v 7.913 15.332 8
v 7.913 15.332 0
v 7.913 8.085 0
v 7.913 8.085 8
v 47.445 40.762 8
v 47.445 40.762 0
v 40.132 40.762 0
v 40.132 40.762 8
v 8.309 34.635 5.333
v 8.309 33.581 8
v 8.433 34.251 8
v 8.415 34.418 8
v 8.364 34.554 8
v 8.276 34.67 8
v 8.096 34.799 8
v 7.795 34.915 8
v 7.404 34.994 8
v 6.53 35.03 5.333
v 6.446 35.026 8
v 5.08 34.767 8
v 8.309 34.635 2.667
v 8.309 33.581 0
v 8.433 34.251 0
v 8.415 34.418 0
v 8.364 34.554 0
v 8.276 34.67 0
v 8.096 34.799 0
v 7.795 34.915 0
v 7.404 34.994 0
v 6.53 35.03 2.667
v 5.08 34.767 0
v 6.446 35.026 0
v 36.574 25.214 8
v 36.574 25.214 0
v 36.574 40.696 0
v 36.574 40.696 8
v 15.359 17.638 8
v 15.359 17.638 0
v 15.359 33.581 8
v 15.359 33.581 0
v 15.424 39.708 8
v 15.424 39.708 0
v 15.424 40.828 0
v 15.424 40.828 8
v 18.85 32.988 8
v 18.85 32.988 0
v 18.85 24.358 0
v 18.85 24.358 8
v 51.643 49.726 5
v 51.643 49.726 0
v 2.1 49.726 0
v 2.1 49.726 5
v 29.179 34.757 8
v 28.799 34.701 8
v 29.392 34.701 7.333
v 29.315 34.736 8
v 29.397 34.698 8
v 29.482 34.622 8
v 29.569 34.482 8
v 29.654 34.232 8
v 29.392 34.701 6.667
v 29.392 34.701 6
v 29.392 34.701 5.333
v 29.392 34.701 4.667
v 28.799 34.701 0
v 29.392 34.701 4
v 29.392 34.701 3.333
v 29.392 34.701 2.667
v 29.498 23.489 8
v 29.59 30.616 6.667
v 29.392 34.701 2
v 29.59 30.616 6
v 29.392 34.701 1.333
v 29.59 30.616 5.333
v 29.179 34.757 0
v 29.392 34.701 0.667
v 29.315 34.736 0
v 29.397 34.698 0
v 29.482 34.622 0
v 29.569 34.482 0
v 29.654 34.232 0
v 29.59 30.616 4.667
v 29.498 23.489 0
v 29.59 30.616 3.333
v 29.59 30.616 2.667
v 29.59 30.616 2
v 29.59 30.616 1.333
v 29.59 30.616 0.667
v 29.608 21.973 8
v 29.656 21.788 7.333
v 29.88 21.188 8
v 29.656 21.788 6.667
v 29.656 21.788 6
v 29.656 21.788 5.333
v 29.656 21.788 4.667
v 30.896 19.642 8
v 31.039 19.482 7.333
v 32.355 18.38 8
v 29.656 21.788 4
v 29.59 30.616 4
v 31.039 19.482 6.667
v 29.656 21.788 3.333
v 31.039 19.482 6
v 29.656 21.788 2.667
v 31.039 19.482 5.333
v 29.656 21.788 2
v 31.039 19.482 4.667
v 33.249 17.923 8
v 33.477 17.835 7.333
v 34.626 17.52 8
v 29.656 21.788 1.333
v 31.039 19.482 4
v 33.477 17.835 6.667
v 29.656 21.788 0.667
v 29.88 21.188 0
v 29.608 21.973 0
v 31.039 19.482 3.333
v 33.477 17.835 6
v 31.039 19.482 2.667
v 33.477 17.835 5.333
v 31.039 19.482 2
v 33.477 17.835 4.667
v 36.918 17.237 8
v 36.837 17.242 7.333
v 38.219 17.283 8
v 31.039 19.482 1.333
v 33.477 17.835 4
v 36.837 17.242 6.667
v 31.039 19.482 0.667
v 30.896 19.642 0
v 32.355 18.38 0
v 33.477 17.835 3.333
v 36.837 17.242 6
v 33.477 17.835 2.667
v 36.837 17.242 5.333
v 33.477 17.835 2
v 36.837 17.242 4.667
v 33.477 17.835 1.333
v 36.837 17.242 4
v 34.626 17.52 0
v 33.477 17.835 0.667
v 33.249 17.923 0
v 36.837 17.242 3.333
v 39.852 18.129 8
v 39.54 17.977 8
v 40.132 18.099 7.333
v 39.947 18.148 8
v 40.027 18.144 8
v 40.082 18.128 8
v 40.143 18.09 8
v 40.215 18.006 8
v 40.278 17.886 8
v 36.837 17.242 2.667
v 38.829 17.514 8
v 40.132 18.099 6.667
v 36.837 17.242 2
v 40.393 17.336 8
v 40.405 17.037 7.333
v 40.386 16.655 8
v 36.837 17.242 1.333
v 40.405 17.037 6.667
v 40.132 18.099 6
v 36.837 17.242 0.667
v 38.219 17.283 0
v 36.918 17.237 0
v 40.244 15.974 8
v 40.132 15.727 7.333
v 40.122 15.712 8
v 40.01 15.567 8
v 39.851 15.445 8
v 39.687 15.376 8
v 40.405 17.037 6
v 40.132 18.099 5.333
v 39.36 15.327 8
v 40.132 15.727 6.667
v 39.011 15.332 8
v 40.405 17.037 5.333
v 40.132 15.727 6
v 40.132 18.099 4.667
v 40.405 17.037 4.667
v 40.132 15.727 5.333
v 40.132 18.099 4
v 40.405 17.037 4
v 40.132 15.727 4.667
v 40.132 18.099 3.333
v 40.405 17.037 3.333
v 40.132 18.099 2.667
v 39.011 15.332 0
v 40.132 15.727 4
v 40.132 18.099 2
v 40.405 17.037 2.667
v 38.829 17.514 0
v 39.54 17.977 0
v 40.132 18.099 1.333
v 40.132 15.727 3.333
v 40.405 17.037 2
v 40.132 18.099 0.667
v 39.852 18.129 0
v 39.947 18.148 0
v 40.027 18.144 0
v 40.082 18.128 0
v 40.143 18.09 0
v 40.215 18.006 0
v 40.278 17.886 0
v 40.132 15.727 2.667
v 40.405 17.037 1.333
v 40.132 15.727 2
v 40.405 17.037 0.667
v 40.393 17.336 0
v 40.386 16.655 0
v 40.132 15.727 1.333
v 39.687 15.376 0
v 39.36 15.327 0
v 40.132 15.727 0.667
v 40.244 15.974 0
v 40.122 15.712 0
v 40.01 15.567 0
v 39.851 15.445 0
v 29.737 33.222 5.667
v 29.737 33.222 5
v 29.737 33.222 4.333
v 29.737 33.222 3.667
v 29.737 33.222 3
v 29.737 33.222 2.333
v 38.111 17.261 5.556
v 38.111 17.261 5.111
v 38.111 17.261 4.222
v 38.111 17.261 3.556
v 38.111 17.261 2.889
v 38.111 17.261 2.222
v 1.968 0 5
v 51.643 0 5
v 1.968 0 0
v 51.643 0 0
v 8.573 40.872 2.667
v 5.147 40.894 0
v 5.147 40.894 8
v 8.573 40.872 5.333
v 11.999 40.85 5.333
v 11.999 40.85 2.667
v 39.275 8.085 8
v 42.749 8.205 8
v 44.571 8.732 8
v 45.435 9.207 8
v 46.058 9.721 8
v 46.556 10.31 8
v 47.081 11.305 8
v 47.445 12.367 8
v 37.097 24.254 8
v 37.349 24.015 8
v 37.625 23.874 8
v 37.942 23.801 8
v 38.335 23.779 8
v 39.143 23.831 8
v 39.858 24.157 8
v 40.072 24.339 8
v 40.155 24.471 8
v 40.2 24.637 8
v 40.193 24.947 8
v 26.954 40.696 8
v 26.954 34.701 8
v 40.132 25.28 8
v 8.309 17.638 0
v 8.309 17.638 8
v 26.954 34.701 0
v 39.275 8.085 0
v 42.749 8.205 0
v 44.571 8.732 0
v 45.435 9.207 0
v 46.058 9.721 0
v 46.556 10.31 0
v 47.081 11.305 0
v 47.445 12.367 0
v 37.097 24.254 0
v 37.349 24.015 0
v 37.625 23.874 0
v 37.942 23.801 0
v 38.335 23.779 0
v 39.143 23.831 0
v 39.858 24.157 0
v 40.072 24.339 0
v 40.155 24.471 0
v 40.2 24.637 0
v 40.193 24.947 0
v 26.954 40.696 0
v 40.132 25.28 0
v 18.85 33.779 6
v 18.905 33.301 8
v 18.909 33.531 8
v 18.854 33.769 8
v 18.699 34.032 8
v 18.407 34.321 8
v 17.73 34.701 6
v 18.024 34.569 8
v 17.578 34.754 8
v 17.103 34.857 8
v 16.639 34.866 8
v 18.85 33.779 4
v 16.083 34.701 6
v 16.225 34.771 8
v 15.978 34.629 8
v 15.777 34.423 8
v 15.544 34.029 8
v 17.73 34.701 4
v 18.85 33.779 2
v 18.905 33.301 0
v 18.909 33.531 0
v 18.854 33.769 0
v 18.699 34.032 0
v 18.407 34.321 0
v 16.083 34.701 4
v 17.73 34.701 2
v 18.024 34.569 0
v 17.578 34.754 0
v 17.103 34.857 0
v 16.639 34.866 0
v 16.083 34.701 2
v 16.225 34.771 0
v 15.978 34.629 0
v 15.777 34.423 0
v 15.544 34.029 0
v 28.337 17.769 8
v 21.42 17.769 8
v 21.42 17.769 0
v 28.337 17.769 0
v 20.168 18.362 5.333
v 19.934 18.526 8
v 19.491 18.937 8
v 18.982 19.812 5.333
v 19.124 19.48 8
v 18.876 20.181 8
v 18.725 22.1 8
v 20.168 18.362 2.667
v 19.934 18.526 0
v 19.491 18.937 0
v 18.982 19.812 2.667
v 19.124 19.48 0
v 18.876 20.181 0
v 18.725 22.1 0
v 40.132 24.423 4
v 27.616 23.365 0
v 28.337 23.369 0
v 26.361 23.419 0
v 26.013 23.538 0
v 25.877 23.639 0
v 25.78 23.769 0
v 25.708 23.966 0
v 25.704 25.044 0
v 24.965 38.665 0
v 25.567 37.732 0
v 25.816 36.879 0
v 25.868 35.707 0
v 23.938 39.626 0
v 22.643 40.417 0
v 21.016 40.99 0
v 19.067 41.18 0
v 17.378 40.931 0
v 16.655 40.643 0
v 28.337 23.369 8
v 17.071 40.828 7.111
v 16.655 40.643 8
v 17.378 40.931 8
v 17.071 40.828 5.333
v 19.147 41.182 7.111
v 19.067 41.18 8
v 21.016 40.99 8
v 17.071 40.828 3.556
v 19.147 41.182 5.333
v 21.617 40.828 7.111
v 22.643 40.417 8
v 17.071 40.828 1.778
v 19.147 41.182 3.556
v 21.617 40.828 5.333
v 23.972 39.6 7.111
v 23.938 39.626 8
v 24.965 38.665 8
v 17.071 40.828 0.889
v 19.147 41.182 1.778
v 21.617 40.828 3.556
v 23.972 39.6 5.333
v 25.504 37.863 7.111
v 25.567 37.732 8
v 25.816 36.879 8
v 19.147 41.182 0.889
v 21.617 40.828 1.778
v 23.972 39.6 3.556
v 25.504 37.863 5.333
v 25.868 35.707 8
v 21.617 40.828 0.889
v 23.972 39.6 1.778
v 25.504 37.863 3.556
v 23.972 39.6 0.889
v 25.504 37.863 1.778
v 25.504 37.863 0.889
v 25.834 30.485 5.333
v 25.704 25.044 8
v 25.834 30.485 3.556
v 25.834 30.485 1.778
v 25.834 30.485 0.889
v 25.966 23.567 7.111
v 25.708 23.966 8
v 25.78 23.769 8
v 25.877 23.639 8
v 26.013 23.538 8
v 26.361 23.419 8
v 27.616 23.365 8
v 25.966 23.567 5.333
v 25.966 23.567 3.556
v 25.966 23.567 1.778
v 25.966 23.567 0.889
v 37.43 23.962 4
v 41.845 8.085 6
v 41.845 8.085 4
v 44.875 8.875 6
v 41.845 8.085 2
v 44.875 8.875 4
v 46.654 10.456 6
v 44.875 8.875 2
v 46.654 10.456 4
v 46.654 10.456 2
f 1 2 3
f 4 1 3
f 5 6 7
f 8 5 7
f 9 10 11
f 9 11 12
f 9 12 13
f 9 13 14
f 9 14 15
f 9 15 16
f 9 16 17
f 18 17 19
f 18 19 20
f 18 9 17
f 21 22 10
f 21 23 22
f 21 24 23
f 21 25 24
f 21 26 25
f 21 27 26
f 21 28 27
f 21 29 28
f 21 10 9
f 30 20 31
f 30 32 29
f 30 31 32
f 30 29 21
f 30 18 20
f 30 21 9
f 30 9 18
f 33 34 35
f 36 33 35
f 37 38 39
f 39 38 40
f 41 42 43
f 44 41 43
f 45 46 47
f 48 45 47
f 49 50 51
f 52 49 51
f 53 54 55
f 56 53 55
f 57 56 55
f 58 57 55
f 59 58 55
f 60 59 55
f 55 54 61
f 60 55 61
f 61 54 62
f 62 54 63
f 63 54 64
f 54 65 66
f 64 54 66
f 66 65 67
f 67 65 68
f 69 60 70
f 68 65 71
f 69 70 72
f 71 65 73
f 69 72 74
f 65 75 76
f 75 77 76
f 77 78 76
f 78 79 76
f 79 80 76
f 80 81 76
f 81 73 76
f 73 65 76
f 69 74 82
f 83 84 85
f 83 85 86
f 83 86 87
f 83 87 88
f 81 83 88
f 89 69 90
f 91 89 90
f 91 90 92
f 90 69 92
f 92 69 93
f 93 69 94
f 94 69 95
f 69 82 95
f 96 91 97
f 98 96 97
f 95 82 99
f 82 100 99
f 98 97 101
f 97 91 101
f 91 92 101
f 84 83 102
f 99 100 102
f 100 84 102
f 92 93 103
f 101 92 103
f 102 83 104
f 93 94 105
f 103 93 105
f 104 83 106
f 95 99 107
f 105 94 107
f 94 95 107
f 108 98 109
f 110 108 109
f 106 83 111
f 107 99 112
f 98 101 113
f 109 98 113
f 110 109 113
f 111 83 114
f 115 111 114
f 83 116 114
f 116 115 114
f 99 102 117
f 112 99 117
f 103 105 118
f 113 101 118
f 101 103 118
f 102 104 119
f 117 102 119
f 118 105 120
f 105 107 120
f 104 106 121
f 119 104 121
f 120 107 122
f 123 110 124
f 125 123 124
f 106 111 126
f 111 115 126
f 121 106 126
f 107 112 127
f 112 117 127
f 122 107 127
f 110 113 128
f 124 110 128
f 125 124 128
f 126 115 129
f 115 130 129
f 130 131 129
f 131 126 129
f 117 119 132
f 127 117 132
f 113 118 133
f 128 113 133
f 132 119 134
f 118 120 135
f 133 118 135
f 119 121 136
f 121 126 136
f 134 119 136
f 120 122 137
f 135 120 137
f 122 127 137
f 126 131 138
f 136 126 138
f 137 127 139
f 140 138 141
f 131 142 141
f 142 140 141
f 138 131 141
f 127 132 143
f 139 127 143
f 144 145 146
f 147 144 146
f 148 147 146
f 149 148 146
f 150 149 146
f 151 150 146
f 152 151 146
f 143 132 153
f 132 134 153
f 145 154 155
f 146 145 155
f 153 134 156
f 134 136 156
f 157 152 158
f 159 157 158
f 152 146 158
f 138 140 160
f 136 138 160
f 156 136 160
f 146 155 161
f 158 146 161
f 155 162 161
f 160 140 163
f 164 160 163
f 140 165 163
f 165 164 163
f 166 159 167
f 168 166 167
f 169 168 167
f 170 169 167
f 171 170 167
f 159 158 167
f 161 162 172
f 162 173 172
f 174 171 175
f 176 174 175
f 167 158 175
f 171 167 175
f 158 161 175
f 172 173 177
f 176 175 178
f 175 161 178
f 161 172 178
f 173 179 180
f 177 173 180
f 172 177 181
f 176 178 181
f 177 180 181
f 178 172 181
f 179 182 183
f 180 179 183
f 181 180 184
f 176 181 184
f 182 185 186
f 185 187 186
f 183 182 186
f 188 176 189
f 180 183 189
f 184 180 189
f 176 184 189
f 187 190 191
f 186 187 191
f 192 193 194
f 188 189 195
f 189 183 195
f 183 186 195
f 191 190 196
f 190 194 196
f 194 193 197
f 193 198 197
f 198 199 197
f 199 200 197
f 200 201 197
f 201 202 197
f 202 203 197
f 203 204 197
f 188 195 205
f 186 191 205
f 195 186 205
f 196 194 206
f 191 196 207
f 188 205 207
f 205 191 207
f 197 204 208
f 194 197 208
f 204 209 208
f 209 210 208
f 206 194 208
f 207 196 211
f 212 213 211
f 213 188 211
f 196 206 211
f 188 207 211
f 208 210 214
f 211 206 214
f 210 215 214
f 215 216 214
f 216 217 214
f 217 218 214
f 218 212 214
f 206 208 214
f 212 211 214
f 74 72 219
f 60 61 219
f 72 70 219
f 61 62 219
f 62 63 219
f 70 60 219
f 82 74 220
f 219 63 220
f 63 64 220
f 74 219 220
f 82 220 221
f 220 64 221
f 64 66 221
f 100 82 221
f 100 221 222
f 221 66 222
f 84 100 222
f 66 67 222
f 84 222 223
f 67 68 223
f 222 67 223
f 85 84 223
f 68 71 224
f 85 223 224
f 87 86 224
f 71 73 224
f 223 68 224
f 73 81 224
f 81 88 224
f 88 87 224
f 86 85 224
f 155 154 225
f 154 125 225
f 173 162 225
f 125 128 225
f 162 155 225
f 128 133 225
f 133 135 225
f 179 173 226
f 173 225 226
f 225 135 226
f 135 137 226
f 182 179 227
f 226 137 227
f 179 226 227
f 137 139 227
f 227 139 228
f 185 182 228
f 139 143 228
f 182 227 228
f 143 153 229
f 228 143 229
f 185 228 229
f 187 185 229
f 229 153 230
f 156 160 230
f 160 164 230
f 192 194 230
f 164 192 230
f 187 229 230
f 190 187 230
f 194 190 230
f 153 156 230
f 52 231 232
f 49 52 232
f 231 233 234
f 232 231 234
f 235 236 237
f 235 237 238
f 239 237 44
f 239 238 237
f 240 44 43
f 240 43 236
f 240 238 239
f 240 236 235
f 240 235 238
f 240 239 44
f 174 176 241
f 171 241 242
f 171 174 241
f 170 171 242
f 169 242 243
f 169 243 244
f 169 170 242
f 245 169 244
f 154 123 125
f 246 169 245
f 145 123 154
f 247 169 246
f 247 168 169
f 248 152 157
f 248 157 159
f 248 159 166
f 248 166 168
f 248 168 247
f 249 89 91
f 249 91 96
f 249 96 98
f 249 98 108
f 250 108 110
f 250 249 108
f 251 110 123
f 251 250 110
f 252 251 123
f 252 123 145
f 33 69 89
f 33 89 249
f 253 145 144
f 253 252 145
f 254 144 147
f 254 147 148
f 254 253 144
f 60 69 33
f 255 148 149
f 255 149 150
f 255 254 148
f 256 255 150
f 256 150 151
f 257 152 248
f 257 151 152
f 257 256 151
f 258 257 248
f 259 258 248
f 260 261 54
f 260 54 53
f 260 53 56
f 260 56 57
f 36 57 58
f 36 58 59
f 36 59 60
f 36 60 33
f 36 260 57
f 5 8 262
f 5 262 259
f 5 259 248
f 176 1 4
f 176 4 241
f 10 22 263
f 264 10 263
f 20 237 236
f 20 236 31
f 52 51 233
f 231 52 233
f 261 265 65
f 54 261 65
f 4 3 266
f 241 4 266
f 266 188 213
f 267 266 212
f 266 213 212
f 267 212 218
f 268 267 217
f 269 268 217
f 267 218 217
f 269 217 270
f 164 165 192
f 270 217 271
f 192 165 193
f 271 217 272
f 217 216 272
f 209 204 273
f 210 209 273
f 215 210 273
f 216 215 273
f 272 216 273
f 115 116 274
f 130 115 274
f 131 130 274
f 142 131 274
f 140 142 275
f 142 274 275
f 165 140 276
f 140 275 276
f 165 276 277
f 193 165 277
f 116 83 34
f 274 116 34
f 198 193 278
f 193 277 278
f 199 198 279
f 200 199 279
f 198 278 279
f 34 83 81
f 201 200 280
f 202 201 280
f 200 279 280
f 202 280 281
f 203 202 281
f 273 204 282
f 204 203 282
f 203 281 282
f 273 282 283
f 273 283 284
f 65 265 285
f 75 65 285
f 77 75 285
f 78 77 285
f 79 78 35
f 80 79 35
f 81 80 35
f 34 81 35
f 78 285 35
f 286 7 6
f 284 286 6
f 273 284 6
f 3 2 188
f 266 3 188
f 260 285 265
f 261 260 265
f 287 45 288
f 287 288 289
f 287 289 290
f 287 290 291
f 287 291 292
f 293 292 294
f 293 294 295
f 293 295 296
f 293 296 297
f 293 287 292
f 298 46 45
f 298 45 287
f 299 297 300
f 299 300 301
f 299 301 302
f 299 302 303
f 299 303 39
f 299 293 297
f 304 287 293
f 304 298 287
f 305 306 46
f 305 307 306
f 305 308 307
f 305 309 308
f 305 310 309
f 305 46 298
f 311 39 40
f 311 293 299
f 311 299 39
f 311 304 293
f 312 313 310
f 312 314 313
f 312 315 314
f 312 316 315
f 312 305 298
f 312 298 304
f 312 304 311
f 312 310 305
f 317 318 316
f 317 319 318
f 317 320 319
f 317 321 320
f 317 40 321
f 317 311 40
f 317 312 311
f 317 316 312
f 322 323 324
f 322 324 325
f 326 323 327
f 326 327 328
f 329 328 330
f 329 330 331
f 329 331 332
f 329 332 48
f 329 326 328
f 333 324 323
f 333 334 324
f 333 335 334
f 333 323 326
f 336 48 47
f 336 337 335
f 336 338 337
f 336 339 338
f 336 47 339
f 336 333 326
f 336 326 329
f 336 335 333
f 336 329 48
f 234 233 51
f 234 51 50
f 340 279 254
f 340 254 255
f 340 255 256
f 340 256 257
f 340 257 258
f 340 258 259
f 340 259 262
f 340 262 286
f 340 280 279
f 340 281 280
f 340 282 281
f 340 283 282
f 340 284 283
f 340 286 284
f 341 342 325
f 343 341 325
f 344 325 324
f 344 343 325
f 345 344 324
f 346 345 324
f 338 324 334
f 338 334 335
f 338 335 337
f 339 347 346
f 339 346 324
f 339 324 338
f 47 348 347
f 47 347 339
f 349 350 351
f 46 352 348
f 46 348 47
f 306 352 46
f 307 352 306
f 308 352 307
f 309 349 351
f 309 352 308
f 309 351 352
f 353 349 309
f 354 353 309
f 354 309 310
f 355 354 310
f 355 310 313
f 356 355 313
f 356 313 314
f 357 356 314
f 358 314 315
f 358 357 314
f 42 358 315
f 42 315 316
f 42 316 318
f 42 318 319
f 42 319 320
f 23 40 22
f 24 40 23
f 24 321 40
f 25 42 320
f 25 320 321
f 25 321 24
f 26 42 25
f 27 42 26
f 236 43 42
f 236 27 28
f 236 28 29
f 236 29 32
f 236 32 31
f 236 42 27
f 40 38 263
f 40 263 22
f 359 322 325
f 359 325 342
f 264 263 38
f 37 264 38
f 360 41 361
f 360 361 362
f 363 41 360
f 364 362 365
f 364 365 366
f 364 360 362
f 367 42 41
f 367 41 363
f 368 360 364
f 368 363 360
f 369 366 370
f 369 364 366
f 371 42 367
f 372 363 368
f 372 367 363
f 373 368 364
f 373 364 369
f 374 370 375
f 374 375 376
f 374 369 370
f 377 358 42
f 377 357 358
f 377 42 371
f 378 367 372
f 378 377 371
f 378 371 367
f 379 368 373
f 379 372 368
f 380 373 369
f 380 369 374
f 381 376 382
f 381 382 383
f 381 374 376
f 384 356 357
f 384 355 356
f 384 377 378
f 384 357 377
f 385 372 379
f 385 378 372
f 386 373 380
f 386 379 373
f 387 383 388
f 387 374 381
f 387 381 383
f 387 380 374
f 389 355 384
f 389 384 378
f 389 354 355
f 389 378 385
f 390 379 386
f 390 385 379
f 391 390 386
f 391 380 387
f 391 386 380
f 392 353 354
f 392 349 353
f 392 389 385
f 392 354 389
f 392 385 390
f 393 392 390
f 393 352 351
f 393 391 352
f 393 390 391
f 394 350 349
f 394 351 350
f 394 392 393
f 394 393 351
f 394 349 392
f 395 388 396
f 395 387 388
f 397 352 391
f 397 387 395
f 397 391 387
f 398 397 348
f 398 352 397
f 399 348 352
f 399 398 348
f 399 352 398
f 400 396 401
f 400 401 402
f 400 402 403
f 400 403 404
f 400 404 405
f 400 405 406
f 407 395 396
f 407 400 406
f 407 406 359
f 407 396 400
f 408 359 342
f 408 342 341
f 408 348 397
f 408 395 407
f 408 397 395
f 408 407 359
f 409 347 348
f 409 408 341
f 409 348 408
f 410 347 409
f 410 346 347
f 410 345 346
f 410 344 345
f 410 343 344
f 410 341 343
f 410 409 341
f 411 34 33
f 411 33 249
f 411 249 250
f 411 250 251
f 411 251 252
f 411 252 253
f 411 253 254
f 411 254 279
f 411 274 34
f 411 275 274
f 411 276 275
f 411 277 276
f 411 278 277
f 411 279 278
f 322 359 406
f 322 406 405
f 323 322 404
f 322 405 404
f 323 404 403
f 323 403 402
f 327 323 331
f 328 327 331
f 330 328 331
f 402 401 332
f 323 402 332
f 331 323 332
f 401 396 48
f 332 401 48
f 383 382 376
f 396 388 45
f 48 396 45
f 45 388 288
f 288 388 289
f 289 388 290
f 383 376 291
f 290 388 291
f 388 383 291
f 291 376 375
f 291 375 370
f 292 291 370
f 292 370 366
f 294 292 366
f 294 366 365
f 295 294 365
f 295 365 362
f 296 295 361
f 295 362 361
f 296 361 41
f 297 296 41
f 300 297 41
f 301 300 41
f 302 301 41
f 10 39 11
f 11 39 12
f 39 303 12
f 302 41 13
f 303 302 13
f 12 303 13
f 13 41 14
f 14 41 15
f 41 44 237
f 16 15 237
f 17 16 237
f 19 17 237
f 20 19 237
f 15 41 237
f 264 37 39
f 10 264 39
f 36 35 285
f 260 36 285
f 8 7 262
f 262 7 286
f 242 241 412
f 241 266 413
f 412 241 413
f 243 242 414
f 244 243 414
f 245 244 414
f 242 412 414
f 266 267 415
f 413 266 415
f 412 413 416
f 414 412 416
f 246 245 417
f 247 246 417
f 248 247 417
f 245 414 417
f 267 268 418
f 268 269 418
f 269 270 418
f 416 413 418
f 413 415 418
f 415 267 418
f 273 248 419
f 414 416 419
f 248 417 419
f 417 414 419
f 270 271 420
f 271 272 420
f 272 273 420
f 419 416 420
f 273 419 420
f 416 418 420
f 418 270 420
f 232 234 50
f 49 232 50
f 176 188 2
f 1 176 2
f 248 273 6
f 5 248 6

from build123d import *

# Parameters (mm, degrees)
F2_DEPTH = 8
F3_DEPTH = 5


with BuildPart() as f2:
    # F0 (on Top) → F2 (new body)
    with BuildSketch(Plane.XY):
        with BuildLine():
            add(Edge.make_bspline(
                [(5.1468131132, 40.8939681947), (8.5726830487, 40.8720076084), (11.9985529842, 40.8500470221), (15.4244229198, 40.8280864358)],
                knots=[0, 0, 0, 0, 10.2778209627, 10.2778209627, 10.2778209627, 10.2778209627], degree=3))
            Line((5.1468131132, 40.8939681947), (5.080409348, 34.7669310868))
            add(Edge.make_bspline(
                [(8.308799006, 33.5810557008), (8.4166843158, 33.9803333101), (8.6664194374, 34.9045892864), (6.4237051335, 35.1374542666), (5.51203556, 34.8859871564), (5.080409348, 34.7669310868)],
                knots=[0, 0, 0, 0, 0.2859570895, 0.6619393193, 1, 1, 1, 1], degree=3))
            Line((8.308799006, 33.5810557008), (8.308799006, 17.6375824958))
            Line((8.308799006, 17.6375824958), (15.3585495427, 17.6375824958))
            Line((15.3585495427, 17.6375824958), (15.3585495427, 33.5810557008))
            add(Edge.make_bspline(
                [(18.8504811376, 32.9881161451), (18.904430445, 33.2510216055), (19.0314662806, 33.870091923), (17.7888736775, 34.885354278), (15.9021250027, 34.9773397156), (15.5332666309, 34.0298520415), (15.3585495427, 33.5810557008)],
                knots=[0, 0, 0, 0, 0.1961885457, 0.4619702654, 0.7451515384, 1, 1, 1, 1], degree=3))
            Line((18.8504811376, 32.9881161451), (18.8504811376, 29.2328353971))
            Line((18.8504811376, 29.2328353971), (18.8504811376, 24.3575591594))
            add(Edge.make_bspline(
                [(21.4196946472, 17.7693478763), (20.998738388, 17.9339115532), (20.0882570431, 18.2898443956), (18.5126469133, 19.7972904354), (18.7225966583, 22.631305425), (18.8504811376, 24.3575591594)],
                knots=[0, 0, 0, 0, 0.2515692999, 0.5441162818, 1, 1, 1, 1], degree=3))
            Line((21.4196946472, 17.7693478763), (28.3373165876, 17.7693478763))
            Line((28.3373165876, 17.7693478763), (28.3373165876, 23.3693271875))
            add(Edge.make_bspline(
                [(15.4244229198, 39.7080928087), (15.8772780445, 40.1285157817), (17.0142769321, 41.1840861537), (21.8140604304, 41.4520448686), (26.1181461223, 38.1373654808), (25.7450356459, 34.7923151584), (25.8836994996, 30.5795922886), (25.7574598703, 25.2537295316), (25.5520065009, 23.2591012307), (27.7616720101, 23.384376934), (28.1832928133, 23.3733540104), (28.3373165876, 23.3693271875)],
                knots=[0, 0, 0, 0, 0.0925877362, 0.2324632035, 0.377515973, 0.4908226249, 0.628656016, 0.7820891305, 0.8617159612, 0.9494829728, 1, 1, 1, 1], degree=3))
            Line((15.4244229198, 39.7080928087), (15.4244229198, 40.8280864358))
        make_face()
    extrude(amount=F2_DEPTH)


with BuildPart() as f2b:
    # F0 (on Top) → F2, piece 2 (new body)
    with BuildSketch(Plane.XY):
        with BuildLine():
            Line((36.5736857057, 40.6963229179), (26.9543994218, 40.6963229179))
            Line((26.9543994218, 40.6963229179), (26.9543994218, 34.7010493279))
            Line((26.9543994218, 34.7010493279), (28.7991948426, 34.7010493279))
            add(Edge.make_bspline(
                [(28.7991948426, 34.7010493279), (29.0179697776, 34.7492759257), (29.5179115702, 34.8594827545), (29.8579618, 33.5617327855), (29.4637782418, 30.5557944136), (29.6007053231, 24.4449926517), (29.3643548029, 21.8207232951), (30.9506305971, 19.3051186145), (33.3392572143, 17.5796904417), (36.81833018, 17.2054325755), (38.7223287817, 17.1663465745), (40.5051795674, 18.9887869043), (40.4871632599, 15.2758483882), (39.4438150633, 15.3153422975), (39.0114448965, 15.3317088261)],
                knots=[0, 0, 0, 0, 0.0425483747, 0.097231023, 0.1955323903, 0.3330400321, 0.4227936155, 0.5134027826, 0.6081768806, 0.710241758, 0.7882670498, 0.854686634, 0.9397812116, 1, 1, 1, 1], degree=3))
            Line((39.0114448965, 15.3317088261), (7.9134861007, 15.3317088261))
            Line((7.9134861007, 15.3317088261), (7.9134861007, 8.0846762285))
            Line((7.9134861007, 8.0846762285), (39.2749905586, 8.0846762285))
            add(Edge.make_bspline(
                [(39.2749905586, 8.0846762285), (40.1007470338, 8.0428695416), (41.8381917289, 7.9549055856), (44.9656603897, 8.6359266811), (46.8081874916, 10.3384773227), (47.237624385, 11.706870454), (47.444794327, 12.3670138419)],
                knots=[0, 0, 0, 0, 0.2522998867, 0.5308551769, 0.7736740664, 1, 1, 1, 1], degree=3))
            Line((47.444794327, 12.3670138419), (47.444794327, 40.7622046769))
            Line((47.444794327, 40.7622046769), (40.1315018535, 40.7622046769))
            Line((40.1315018535, 40.7622046769), (40.1315018535, 25.2799093723))
            add(Edge.make_bspline(
                [(39.1432195902, 23.8305013627), (39.5611051913, 23.9922928388), (40.3392298138, 24.293556943), (40.1972380684, 24.9677748134), (40.1315018535, 25.2799093723)],
                knots=[0, 0, 0, 0, 0.537041997, 1, 1, 1, 1], degree=3))
            add(Edge.make_bspline(
                [(36.5736857057, 25.2140257508), (36.7983932338, 24.7057045633), (37.2622580013, 23.656374835), (38.5033454801, 23.7712662047), (39.1432195902, 23.8305013627)],
                knots=[0, 0, 0, 0, 0.484424651, 1, 1, 1, 1], degree=3))
            Line((36.5736857057, 25.2140257508), (36.5736857057, 40.6963229179))
        make_face()
    extrude(amount=F2_DEPTH)


with BuildPart() as f3:
    # F1 (on Top) → F3 (new body)
    with BuildSketch(Plane.XY):
        Polygon((51.6432598233, 49.7257225215), (2.0999109838, 49.7257225215), (1.9681467675, 0), (51.6432598233, 0), align=None)
    extrude(amount=F3_DEPTH)


solid = Compound([f2.part, f2b.part, f3.part])
